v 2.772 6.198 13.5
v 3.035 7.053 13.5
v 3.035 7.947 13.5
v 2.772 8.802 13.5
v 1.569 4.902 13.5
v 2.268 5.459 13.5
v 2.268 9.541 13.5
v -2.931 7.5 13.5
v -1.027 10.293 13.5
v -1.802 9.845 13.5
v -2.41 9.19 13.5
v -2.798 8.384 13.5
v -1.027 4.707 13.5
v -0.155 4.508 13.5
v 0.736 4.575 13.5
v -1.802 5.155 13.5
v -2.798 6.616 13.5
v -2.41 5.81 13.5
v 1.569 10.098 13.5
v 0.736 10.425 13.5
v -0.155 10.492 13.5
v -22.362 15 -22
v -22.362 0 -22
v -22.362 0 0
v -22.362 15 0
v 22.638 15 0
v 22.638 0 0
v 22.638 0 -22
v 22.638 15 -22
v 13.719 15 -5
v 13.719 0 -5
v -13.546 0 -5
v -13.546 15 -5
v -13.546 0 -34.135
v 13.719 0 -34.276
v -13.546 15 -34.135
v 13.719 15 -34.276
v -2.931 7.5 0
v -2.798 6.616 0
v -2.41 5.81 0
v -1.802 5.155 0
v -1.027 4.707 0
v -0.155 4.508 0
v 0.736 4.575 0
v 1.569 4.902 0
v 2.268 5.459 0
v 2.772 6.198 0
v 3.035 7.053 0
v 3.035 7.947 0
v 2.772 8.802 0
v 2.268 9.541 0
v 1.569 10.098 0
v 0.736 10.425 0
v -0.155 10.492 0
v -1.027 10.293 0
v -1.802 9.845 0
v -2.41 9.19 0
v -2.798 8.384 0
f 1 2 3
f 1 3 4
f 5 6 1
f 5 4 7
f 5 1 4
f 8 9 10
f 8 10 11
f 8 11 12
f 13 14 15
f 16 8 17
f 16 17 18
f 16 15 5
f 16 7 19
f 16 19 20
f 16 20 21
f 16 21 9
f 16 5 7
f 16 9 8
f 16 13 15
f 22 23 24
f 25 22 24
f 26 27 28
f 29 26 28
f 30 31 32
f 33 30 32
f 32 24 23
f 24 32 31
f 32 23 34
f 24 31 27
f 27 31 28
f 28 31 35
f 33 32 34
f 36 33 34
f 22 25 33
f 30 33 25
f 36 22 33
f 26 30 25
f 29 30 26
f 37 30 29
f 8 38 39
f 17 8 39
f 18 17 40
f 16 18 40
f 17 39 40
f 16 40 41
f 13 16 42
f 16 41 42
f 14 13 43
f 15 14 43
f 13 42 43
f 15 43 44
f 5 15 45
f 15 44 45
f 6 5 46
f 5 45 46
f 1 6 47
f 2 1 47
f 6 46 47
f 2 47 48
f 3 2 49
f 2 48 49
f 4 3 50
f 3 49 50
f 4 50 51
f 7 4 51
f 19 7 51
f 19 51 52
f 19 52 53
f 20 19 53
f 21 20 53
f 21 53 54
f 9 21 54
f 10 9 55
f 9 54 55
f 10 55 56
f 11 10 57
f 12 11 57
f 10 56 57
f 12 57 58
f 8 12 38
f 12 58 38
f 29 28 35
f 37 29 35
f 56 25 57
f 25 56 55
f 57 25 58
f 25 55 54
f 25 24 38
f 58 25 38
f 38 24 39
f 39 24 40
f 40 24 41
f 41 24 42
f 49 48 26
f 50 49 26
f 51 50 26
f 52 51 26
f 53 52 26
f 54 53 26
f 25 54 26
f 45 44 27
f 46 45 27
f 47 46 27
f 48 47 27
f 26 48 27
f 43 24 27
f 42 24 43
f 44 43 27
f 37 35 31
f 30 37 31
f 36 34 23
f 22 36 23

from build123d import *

# Parameters (mm, degrees)
BOSS_EXTRUDE1_DEPTH = 15
SKETCH4_R           = 3
BOSS_EXTRUDE2_DEPTH = 13.5


with BuildPart() as part:
    # Sketch3 → Boss-Extrude1 (new body)
    with BuildSketch(Plane(origin=(0, 0, 0), x_dir=(1, 0, 0), z_dir=(0, 1, 0))):
        Polygon((-22.362385321, 0), (22.637614679, 0), (22.637614679, 22), (13.718917102, 34.275534099), (13.718917102, 5), (-13.545606537, 5), (-13.545606537, 34.135254916), (-22.362385321, 22), align=None)
    extrude(amount=BOSS_EXTRUDE1_DEPTH)

    # Sketch4 → Boss-Extrude2 (add)
    with BuildSketch(Plane.XY):
        with Locations(Location((0.068807339, 7.5, 0), (0, 0, 180))):
            Circle(SKETCH4_R)
    extrude(amount=BOSS_EXTRUDE2_DEPTH)


solid = part.part
